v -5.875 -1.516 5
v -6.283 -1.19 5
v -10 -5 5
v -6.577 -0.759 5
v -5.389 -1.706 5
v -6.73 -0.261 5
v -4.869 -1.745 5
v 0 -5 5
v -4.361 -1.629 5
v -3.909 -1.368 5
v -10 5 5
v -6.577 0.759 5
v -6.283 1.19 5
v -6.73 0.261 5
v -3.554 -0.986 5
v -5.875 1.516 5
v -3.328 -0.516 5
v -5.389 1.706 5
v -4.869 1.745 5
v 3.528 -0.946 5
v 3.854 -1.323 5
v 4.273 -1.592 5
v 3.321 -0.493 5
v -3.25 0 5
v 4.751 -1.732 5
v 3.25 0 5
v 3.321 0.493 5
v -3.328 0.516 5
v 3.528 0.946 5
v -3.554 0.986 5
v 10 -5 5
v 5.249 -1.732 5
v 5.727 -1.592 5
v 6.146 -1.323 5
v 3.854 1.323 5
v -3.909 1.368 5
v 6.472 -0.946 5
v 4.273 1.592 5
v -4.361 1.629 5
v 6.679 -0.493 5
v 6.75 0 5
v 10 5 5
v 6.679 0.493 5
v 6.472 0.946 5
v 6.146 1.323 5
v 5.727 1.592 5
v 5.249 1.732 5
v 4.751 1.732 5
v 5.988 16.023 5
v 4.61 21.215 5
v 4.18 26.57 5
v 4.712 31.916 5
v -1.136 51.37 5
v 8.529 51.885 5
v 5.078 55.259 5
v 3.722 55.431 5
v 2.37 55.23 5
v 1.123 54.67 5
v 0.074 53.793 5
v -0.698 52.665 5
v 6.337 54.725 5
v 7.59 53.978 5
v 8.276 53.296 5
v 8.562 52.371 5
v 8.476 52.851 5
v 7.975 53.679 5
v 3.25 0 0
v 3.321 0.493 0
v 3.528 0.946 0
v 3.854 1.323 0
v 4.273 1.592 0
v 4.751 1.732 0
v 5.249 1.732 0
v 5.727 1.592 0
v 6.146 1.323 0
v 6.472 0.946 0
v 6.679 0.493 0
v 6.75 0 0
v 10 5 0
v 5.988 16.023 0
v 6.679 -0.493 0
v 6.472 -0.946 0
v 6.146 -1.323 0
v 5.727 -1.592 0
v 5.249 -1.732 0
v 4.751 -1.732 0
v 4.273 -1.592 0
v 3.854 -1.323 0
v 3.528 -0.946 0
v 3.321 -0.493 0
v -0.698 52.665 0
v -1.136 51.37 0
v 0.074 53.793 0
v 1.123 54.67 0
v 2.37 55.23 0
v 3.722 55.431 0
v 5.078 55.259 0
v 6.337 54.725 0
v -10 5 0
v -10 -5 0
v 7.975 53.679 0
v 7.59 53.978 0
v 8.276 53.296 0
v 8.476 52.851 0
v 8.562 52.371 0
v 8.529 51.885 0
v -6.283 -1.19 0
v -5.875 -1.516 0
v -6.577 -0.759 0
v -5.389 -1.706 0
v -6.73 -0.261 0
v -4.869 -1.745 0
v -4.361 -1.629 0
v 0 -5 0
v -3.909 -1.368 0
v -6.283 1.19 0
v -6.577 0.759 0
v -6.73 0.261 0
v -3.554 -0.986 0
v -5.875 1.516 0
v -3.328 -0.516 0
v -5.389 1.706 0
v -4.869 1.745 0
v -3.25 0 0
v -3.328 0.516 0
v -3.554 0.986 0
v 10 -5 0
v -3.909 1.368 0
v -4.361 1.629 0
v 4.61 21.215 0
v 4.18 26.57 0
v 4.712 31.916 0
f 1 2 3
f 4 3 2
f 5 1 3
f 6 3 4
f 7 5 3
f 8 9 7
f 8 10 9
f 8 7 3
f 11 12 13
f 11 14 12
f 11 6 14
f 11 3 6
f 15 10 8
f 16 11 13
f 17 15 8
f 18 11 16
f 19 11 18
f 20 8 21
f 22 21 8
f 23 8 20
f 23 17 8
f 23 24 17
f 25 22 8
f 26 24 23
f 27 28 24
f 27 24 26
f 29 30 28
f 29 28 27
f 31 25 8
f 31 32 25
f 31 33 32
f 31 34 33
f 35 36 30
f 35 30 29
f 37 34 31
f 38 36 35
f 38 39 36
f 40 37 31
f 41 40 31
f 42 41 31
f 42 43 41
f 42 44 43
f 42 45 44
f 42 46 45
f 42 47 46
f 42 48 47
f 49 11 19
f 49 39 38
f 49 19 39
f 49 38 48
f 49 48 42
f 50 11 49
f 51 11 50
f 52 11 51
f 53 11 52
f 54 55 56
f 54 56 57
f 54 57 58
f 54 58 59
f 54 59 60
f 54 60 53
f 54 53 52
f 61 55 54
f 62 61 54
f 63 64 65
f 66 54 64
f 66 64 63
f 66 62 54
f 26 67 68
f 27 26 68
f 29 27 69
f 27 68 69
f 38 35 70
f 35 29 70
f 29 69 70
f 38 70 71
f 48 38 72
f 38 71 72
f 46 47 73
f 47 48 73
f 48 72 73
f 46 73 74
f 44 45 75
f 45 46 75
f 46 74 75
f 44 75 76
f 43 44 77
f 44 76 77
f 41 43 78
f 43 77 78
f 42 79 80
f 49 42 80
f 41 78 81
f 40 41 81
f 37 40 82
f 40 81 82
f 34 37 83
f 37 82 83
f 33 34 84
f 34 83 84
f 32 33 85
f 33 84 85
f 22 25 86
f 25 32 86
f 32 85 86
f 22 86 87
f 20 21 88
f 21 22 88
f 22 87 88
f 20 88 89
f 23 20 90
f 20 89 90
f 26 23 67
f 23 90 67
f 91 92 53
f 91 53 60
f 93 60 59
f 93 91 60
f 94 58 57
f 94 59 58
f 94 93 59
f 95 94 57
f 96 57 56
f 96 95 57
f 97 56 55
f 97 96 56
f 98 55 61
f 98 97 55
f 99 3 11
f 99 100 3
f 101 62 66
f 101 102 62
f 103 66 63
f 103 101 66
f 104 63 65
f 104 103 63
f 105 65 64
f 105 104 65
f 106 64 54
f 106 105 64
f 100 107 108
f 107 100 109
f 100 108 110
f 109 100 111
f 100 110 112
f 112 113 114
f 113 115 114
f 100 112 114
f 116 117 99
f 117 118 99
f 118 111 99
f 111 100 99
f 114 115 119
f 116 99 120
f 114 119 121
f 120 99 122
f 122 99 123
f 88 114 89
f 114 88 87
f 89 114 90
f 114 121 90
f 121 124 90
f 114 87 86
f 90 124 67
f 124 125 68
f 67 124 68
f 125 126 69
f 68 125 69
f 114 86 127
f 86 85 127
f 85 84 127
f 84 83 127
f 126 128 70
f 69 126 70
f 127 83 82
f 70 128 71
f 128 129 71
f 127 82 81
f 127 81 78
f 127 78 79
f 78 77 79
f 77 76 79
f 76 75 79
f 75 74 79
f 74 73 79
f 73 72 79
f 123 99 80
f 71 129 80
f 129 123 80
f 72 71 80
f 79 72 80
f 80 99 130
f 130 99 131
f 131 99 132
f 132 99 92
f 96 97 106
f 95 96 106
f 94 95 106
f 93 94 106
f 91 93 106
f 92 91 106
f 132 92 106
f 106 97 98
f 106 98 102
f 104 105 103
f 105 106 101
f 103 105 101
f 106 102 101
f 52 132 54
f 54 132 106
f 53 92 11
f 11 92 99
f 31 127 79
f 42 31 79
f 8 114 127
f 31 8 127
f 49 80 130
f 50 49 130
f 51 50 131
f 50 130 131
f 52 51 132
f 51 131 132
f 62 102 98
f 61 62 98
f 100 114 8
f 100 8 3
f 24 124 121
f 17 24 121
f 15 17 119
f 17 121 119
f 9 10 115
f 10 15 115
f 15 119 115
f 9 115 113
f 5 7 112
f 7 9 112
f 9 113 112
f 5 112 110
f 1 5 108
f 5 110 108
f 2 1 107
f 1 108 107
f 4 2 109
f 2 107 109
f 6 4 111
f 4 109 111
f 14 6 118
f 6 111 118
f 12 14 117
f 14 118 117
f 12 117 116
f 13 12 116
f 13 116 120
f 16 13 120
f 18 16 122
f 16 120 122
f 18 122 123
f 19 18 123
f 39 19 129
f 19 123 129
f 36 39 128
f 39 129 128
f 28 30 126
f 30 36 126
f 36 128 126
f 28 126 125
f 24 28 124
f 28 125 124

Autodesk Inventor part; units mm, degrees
ref_plane "YZ Plane" through (0, 0, 0) normal (1, 0, 0) x (0, 1, 0)
ref_plane "XZ Plane" through (0, 0, 0) normal (0, 1, 0) x (-1, 0, 0)
ref_plane "XY Plane" through (0, 0, 0) normal (0, 0, 1) x (1, 0, 0)
sketch "Sketch1" plane through (0, 0, 0) normal (0, 0, 1) x (1, 0, 0)
  line L0 (0, 0) -> (5, 0)
  line L1 (5, 0) -> (-5, 0)
  circle A0 centre (-5, 0) radius 1.75
  circle A1 centre (5, 0) radius 1.75
  line L2 (0, 0) -> (0, -5)
  line L3 (0, -5) -> (10, -5)
  line L4 (10, -5) -> (10, 5)
  line L5 (0, -5) -> (-10, -5)
  line L6 (-10, -5) -> (-10, 5)
  line L7 (10, 5) -> (5.9879, 16.023)
  line L8 (10, 5) -> (21.7305, 5) construction
  line L9 (4.7122, 31.9163) -> (8.5293, 51.8848)
  line L10 (7.5896, 53.9779) -> (6.3368, 54.7253)
  line L11 (-1.1361, 51.3703) -> (-10, 5)
  arc A2 (4.7122, 31.9163) -> (5.9879, 16.023) centre (34.1787, 26.2837) ccw
  arc A3 (8.5293, 51.8848) -> (7.5896, 53.9779) centre (6.5649, 52.2603) ccw
  arc A4 (6.3368, 54.7253) -> (-1.1361, 51.3703) centre (3.775, 50.4315) ccw
  point P0 (3.1596, 23.7939)
  point P1 (8.7922, 53.2603)
  point P2 (0.2046, 58.384)
  dimension "d0" = 5
  dimension "d1" = 10
  dimension "d2" = 3.5
  dimension "d3" = 3.5
  dimension "d4" = 5
  dimension "d5" = 10
  dimension "d6" = 10
  dimension "d7" = 10
  dimension "d8" = 10
  dimension "d9" = 20
  dimension "d10" = 110
  dimension "d11" = 30
  dimension "d12" = 10
  dimension "d13" = 110
  dimension "d14" = 30
  dimension "d15" = 2
  dimension "d16" = 5
extrude "Extrusion1" add sketch "Sketch1" along normal blind 5
properties part number "gripper"
